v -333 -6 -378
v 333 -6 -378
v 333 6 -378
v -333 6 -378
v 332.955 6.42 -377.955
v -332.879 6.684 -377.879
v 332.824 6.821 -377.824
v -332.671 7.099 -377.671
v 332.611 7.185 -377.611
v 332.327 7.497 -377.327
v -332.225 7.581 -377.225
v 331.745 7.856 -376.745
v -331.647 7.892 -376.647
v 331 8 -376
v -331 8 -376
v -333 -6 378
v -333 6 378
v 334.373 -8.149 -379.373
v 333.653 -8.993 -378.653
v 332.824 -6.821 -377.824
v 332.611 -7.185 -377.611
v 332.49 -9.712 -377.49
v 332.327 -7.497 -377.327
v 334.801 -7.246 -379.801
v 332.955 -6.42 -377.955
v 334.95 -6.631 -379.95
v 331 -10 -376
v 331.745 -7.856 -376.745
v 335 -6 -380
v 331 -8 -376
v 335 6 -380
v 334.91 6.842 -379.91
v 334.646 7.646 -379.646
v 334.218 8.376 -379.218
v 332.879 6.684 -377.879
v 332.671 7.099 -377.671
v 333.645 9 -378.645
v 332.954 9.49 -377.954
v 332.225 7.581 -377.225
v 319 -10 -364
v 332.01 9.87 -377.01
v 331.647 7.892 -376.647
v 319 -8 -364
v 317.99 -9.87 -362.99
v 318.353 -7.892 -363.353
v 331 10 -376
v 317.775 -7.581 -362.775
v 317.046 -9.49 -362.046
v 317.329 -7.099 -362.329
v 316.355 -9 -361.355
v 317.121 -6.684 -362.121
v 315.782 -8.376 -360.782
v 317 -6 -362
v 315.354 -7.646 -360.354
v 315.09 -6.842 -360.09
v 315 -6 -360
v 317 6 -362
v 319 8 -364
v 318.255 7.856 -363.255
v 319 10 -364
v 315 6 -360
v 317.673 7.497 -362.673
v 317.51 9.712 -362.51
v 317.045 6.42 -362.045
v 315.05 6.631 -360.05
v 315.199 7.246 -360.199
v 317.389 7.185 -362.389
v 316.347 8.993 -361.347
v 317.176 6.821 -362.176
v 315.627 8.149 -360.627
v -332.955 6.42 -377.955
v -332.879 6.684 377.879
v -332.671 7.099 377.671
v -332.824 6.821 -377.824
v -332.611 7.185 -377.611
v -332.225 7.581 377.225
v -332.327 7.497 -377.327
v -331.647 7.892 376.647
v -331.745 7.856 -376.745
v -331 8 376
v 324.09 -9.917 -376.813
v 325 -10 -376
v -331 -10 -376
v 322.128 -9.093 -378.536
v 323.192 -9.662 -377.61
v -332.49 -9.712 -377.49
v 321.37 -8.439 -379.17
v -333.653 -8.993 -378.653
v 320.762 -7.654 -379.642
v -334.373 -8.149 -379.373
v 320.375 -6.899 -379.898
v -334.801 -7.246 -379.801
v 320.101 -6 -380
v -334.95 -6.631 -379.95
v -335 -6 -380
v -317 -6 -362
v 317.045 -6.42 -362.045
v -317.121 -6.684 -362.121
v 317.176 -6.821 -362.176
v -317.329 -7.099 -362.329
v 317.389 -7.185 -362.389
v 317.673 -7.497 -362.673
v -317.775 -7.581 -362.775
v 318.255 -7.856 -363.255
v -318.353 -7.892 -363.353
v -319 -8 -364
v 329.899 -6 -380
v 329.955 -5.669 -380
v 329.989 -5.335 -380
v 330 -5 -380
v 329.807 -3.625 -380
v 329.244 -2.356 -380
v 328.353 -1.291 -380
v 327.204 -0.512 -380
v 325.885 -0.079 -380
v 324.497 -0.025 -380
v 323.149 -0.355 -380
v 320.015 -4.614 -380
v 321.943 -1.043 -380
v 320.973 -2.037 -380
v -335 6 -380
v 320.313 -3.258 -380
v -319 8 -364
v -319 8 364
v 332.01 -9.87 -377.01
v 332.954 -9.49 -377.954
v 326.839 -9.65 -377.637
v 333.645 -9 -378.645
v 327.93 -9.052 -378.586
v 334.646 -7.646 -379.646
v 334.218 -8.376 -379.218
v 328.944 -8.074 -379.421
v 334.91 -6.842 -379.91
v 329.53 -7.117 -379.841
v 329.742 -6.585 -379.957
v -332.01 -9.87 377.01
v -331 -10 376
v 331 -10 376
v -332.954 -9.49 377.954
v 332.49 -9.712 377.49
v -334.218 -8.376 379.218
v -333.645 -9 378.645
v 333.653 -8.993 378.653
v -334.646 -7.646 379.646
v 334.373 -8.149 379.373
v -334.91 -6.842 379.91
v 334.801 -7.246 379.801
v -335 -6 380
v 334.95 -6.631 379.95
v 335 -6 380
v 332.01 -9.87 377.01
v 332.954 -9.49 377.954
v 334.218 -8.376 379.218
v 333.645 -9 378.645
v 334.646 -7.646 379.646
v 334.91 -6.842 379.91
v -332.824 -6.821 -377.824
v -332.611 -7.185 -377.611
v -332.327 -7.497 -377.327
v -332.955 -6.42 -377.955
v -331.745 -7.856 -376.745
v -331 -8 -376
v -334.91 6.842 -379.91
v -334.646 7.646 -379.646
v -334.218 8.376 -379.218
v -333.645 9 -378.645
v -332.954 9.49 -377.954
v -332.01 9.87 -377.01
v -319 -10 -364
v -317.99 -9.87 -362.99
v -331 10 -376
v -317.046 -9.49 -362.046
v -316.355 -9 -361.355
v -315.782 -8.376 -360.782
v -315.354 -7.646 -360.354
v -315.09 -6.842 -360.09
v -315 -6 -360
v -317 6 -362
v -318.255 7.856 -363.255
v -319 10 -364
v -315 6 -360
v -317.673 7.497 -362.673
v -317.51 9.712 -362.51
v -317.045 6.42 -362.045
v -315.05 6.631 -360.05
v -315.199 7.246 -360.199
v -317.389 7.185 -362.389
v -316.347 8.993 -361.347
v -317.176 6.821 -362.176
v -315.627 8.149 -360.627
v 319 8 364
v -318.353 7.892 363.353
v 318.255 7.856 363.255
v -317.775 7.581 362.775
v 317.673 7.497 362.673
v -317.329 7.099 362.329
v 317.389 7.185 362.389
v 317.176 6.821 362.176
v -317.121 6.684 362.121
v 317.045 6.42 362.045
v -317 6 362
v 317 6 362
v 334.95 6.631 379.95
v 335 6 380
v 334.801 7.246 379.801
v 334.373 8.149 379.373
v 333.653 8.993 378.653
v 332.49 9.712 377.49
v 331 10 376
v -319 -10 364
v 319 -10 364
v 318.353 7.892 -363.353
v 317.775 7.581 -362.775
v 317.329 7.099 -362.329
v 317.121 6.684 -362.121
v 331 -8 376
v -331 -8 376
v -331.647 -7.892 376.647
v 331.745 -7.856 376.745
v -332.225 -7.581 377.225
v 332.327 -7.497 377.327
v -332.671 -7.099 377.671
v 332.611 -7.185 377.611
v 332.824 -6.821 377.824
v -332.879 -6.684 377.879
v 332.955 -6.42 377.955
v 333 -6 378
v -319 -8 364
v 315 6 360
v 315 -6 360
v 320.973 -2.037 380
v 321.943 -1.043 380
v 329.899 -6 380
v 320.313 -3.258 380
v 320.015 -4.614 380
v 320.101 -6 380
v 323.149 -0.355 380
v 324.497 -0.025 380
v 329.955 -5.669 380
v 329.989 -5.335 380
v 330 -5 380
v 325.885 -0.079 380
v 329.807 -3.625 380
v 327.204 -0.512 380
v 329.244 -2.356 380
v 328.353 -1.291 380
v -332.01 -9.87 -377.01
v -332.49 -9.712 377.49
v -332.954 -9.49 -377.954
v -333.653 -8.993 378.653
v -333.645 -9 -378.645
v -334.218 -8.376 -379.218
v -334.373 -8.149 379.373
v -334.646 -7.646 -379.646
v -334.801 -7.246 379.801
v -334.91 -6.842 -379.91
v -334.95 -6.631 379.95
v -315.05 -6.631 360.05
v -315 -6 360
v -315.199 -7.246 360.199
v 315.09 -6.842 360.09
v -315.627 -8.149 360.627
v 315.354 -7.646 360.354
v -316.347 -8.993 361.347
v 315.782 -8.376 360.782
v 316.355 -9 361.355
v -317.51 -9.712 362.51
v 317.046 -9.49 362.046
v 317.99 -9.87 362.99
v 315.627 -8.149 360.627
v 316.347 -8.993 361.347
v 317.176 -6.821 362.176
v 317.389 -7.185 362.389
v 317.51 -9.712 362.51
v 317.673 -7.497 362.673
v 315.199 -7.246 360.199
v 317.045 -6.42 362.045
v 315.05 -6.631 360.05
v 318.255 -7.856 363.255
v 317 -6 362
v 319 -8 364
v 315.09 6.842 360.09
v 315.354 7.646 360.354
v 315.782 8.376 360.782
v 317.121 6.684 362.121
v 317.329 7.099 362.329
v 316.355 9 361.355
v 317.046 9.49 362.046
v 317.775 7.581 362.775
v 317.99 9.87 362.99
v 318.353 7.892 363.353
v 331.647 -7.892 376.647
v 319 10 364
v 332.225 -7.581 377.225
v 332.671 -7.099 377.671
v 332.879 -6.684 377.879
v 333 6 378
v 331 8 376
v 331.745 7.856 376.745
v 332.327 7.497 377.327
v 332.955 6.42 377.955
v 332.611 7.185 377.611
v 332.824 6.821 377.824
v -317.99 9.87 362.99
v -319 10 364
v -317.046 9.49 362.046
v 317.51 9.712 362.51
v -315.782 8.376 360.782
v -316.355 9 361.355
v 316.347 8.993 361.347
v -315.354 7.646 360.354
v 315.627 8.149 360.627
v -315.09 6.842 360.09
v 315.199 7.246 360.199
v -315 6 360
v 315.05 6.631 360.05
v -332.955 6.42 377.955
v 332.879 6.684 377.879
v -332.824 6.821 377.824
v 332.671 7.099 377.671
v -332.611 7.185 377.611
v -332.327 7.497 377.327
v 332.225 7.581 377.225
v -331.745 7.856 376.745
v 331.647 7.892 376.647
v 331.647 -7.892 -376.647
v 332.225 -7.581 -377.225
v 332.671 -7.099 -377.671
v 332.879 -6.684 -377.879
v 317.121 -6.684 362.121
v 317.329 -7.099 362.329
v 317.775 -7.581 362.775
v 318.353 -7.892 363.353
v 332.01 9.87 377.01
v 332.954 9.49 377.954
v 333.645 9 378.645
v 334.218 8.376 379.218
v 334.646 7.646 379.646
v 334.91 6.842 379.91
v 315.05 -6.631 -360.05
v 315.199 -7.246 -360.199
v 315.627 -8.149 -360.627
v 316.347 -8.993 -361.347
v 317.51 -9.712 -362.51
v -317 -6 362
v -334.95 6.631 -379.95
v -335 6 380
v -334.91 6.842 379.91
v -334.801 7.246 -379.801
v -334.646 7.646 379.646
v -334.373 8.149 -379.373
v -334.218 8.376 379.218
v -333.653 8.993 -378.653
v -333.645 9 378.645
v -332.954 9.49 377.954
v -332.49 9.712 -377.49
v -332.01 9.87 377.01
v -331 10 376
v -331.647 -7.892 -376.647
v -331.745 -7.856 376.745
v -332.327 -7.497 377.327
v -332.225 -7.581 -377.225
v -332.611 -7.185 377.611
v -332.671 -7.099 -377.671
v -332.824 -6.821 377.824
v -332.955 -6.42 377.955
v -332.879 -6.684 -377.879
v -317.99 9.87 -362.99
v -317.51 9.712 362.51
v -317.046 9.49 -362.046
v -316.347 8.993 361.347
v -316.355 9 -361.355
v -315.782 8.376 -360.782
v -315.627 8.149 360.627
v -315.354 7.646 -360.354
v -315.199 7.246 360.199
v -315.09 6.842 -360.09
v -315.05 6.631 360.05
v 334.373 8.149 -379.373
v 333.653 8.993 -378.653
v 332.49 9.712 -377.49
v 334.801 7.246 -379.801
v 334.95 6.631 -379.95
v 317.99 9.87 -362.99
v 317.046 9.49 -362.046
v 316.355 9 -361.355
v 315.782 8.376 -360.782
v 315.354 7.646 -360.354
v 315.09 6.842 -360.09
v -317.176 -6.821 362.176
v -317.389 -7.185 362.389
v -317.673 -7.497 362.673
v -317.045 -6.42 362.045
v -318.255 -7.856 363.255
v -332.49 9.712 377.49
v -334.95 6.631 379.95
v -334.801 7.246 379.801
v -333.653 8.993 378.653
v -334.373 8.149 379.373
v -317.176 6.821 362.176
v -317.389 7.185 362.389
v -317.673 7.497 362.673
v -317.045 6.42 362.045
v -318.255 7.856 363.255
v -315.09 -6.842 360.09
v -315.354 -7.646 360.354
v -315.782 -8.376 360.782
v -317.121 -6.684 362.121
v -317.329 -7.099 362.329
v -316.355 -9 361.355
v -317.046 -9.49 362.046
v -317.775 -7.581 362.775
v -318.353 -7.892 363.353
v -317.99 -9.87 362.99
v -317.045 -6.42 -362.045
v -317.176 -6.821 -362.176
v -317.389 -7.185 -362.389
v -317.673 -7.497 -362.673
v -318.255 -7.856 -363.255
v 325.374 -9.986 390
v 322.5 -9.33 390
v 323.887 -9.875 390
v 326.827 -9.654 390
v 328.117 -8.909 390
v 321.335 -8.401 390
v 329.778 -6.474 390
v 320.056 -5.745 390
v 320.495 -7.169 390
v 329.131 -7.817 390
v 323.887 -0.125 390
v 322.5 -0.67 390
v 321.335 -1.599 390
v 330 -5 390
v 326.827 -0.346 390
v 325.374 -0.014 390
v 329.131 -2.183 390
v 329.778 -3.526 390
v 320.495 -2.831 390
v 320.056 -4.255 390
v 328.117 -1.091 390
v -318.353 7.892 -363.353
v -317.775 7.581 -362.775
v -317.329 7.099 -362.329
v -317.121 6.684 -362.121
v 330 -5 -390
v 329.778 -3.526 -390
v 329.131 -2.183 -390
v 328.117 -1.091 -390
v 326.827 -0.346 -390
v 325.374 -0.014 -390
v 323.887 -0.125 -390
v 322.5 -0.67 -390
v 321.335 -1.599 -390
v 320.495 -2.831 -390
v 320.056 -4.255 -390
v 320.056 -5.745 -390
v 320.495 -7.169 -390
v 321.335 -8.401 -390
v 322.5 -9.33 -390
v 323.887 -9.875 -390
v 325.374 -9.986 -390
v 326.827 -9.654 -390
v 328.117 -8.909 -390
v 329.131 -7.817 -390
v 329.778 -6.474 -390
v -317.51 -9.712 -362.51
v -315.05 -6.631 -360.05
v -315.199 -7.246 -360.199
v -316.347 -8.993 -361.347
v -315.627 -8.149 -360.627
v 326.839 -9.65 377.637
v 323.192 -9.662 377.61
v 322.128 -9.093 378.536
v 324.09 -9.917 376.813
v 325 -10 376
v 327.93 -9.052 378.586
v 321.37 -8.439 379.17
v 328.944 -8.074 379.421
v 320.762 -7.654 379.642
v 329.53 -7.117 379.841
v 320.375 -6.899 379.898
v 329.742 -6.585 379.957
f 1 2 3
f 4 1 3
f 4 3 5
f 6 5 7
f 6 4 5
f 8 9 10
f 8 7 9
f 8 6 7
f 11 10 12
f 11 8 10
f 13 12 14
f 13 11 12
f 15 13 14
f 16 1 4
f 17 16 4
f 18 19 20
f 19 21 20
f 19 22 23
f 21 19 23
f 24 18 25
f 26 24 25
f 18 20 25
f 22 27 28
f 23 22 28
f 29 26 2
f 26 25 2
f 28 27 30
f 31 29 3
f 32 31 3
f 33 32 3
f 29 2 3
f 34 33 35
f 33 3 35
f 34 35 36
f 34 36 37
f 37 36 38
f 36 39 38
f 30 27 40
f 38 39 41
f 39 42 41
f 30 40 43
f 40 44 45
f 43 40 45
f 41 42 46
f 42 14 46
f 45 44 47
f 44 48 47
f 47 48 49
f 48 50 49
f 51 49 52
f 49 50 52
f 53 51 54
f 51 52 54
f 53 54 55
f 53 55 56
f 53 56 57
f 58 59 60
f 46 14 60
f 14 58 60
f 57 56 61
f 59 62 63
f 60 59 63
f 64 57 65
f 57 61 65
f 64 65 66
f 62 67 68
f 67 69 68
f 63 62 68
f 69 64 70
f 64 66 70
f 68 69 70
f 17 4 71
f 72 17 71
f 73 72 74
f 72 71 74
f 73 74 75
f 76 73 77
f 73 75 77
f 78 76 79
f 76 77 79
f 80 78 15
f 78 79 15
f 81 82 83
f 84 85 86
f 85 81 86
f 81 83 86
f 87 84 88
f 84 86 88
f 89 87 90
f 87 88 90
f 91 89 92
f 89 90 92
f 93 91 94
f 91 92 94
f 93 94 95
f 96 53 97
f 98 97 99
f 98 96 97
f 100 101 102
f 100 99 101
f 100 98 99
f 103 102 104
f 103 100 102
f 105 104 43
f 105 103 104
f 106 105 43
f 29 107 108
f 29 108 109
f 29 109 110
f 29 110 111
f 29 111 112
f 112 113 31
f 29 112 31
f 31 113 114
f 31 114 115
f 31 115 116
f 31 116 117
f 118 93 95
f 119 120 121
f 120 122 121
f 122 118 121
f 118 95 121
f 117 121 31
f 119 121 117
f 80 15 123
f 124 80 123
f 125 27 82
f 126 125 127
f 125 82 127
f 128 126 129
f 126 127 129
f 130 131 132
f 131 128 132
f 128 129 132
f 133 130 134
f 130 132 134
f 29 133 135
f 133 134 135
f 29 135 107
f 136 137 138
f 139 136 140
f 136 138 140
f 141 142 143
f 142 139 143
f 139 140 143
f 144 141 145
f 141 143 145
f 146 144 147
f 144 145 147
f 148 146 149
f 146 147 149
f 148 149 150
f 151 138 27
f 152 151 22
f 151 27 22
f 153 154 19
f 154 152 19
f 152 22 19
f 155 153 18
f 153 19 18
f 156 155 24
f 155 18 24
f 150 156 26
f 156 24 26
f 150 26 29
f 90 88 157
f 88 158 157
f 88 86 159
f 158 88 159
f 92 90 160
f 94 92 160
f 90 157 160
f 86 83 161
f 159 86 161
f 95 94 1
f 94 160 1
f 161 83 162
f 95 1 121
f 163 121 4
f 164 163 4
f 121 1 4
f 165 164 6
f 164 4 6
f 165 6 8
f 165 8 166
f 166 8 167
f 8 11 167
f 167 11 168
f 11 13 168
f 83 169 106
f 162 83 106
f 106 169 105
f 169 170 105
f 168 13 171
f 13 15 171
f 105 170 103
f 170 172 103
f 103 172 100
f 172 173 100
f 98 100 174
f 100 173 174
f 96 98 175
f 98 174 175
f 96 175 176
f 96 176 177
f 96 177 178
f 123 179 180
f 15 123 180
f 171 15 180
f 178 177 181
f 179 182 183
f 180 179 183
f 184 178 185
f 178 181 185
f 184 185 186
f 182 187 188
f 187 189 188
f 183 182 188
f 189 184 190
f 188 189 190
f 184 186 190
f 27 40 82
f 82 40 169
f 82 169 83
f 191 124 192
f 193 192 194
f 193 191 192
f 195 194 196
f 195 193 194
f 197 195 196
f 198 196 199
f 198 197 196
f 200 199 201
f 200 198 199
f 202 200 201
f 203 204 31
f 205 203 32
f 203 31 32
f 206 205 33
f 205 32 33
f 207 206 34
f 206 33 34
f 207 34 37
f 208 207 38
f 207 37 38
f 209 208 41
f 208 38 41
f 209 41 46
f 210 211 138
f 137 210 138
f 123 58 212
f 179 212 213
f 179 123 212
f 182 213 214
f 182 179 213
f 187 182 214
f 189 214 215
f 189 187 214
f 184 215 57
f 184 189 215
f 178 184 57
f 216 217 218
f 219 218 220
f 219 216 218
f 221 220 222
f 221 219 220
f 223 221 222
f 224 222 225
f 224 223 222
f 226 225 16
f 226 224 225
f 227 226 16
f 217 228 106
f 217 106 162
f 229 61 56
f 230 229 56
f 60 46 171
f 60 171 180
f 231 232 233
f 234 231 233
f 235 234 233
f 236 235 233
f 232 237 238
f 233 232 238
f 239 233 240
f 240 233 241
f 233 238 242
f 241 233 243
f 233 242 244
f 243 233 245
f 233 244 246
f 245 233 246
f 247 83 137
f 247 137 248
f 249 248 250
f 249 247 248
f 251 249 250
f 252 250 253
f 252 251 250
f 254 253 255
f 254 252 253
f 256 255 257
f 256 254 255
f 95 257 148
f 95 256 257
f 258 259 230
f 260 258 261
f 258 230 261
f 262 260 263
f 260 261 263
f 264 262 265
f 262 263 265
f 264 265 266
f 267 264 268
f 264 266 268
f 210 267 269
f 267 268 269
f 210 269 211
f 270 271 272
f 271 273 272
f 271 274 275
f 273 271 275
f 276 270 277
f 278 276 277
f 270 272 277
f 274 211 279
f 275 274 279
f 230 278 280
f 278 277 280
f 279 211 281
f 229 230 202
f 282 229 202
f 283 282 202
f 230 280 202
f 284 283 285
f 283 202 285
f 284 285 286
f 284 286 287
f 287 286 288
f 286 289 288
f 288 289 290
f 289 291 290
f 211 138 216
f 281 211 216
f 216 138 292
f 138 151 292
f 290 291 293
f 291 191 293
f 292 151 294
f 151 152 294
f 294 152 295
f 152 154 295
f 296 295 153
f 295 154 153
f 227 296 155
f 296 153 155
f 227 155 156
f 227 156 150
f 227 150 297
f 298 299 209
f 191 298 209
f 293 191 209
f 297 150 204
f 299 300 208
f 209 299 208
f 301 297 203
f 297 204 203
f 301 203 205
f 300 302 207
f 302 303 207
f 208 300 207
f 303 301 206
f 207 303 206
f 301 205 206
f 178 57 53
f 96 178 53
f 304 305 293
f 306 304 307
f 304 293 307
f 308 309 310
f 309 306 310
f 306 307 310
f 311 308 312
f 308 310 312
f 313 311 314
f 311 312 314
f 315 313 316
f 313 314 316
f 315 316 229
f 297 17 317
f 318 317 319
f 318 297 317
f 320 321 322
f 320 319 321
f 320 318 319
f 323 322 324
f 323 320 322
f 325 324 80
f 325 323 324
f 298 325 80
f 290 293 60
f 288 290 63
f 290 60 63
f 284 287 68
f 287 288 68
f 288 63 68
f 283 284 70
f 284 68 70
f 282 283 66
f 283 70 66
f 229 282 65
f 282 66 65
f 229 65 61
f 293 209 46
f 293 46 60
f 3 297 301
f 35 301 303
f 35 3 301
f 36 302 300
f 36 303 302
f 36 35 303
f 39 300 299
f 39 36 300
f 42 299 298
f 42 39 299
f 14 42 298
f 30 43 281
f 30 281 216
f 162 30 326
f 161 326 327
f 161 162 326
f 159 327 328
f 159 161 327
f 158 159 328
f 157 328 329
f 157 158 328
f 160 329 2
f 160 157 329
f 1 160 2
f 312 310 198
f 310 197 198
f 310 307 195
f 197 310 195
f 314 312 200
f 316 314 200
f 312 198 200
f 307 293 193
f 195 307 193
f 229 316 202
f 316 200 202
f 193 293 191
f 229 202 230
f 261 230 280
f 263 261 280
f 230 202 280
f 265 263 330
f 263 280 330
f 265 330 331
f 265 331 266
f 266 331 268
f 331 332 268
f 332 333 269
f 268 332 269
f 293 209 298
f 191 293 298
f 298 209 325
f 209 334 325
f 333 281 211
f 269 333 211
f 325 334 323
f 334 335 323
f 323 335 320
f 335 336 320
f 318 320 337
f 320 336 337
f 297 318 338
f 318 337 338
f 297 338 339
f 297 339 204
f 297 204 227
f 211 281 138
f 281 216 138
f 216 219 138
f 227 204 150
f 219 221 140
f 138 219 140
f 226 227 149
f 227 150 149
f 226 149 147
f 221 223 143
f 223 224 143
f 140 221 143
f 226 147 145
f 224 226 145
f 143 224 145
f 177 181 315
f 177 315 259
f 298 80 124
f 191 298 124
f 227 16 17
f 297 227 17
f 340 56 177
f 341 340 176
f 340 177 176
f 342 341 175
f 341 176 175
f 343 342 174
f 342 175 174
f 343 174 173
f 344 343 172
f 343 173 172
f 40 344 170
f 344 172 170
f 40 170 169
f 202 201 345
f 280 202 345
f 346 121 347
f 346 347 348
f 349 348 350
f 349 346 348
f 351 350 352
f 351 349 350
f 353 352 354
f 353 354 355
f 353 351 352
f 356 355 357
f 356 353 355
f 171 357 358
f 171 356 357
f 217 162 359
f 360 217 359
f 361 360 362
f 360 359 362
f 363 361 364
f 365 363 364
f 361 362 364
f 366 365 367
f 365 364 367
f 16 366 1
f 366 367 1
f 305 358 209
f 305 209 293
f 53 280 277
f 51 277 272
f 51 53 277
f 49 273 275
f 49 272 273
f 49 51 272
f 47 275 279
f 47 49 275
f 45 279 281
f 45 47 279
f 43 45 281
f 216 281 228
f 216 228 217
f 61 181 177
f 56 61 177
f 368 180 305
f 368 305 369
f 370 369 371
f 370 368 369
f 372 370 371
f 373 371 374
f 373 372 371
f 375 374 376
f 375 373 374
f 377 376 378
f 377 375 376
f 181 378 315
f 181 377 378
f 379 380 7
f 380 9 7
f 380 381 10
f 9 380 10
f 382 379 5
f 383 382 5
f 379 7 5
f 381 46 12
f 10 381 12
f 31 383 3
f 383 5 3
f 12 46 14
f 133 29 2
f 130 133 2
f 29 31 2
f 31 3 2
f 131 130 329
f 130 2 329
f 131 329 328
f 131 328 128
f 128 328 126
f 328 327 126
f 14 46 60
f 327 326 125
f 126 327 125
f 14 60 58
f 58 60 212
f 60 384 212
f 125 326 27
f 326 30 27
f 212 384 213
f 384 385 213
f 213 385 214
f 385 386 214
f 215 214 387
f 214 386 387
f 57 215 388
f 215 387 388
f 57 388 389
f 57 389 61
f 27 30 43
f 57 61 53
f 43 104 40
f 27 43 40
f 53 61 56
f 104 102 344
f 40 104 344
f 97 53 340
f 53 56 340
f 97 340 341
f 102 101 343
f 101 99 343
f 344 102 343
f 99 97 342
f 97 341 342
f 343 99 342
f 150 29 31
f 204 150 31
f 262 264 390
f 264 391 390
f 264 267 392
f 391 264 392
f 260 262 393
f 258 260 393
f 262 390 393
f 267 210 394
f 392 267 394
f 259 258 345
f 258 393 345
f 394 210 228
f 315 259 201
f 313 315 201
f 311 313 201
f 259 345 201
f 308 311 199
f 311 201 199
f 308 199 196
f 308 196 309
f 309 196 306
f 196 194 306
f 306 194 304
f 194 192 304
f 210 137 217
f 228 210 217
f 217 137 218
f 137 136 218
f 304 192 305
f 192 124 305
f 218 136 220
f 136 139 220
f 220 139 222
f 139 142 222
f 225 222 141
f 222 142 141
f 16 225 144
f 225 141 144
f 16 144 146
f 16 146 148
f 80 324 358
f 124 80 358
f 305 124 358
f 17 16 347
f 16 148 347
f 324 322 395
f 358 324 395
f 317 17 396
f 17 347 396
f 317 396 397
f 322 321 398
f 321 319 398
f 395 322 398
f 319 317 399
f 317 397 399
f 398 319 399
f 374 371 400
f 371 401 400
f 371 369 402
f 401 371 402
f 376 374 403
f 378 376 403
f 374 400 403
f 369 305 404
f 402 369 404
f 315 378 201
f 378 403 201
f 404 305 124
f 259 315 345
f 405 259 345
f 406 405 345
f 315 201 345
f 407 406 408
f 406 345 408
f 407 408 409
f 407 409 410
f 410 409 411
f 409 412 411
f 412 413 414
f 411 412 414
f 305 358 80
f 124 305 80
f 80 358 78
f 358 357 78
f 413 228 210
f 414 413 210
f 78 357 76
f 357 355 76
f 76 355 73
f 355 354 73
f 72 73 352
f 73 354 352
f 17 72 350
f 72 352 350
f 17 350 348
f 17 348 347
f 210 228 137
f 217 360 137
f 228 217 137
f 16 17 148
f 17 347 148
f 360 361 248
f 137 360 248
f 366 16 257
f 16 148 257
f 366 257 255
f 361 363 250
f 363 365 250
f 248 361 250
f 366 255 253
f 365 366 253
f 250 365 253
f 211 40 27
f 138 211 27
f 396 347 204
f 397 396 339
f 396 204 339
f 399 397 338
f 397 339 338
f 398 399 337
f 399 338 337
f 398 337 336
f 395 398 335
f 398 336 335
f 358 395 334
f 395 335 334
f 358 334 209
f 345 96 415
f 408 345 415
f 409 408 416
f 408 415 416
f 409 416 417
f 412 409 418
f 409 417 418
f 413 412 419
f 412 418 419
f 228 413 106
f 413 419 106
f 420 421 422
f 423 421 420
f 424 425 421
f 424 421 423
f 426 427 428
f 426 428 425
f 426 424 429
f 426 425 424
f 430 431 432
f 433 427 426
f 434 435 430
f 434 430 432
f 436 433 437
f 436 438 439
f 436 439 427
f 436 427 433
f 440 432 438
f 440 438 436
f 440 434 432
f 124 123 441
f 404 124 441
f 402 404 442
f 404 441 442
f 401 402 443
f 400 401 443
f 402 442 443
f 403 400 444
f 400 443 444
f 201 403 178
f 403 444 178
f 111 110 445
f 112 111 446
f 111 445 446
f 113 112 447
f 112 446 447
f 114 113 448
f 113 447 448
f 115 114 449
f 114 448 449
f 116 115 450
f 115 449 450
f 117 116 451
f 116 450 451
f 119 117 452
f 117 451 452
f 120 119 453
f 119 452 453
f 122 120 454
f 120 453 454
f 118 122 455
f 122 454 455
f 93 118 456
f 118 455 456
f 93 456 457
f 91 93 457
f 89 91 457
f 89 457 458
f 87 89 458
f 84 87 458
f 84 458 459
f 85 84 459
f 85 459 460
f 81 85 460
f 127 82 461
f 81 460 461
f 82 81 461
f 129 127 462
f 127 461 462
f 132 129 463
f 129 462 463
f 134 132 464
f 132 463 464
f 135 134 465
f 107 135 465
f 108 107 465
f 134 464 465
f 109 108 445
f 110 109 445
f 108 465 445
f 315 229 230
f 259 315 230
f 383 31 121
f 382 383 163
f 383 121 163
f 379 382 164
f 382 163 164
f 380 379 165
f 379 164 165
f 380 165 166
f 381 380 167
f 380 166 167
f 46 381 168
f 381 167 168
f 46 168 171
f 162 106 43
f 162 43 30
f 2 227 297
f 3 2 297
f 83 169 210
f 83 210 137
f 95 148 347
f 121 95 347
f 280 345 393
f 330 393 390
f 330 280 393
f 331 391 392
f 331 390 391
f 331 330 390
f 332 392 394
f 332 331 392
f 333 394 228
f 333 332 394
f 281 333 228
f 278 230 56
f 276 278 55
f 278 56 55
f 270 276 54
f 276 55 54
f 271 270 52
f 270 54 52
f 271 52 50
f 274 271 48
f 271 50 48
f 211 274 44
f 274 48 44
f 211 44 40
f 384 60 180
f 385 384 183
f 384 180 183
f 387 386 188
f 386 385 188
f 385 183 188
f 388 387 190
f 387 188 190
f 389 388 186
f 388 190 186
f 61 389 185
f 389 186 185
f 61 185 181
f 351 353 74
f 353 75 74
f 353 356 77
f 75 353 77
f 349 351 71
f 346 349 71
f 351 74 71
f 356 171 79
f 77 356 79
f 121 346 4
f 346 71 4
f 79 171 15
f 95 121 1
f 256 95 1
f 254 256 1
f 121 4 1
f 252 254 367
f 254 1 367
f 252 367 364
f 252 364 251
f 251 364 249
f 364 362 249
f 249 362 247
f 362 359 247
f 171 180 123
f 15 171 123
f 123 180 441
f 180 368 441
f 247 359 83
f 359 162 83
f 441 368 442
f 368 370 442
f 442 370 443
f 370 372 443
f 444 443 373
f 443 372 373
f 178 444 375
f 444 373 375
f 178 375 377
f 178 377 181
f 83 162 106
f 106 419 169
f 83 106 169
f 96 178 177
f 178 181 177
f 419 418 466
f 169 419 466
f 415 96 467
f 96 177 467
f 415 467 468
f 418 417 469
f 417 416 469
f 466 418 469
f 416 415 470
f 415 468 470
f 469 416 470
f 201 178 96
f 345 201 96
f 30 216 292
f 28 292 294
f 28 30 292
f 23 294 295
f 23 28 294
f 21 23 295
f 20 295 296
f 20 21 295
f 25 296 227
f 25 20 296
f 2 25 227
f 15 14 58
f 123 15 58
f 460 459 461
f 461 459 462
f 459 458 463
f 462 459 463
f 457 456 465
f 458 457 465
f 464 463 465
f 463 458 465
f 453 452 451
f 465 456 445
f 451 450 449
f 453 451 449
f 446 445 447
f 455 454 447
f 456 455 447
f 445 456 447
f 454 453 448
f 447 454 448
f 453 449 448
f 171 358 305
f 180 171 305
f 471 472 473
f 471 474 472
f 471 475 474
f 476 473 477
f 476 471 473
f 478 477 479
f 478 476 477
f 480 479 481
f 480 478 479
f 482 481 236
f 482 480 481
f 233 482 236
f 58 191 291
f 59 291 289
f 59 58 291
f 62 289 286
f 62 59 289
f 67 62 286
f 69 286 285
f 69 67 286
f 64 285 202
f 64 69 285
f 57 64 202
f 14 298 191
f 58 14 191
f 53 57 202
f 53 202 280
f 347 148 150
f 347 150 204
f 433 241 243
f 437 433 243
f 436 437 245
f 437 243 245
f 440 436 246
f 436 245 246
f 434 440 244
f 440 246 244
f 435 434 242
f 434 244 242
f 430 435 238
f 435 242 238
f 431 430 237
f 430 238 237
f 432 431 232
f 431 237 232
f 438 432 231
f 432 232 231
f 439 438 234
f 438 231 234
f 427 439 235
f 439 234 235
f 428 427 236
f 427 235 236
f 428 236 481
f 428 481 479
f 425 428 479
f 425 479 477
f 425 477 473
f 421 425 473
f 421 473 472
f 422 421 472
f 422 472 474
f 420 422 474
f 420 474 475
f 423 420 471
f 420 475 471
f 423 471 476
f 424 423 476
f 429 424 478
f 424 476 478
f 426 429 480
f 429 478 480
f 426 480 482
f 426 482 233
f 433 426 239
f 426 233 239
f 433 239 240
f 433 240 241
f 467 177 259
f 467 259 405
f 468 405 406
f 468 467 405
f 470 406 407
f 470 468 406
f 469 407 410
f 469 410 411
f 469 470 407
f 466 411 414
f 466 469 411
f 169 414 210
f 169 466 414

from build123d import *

# Parameters (mm, degrees)
SQUARE_TUBE_CONFIGURED_20_X_20_X_2_1_DEPTH      = 755.142135624
SQUARE_TUBE_CONFIGURED_20_X_20_X_2_1_DEPTH_BACK = 15.142135624
SQUARE_TUBE_CONFIGURED_20_X_20_X_2_1_2_DEPTH    = 680.284271247
SQUARE_TUBE_CONFIGURED_20_X_20_X_2_1_3_DEPTH    = 770.284271247
SQUARE_TUBE_CONFIGURED_20_X_20_X_2_1_4_DEPTH    = 680.284271247
SKETCH13_R                                      = 5
BOSS_EXTRUDE1_DEPTH                             = 10
BOSS_EXTRUDE1_DIRECTION_2_REACH                 = 832.617


with BuildPart() as part:
    # Sketch12 → Square tube - configured 20 X 20 X 2(1) (new, two sides)
    with BuildSketch(Plane(origin=(-325, 0, 370), x_dir=(-1, 0, 0), z_dir=(0, 0, -1))) as square_tube_configured_20_x_20_x_2_1_sk:
        with BuildLine():
            Line((-6, -10), (6, -10))
            ThreePointArc((6, -10), (8.828427125, -8.828427125), (10, -6))
            Line((10, -6), (10, 6))
            ThreePointArc((10, 6), (8.828427125, 8.828427125), (6, 10))
            Line((6, 10), (-6, 10))
            ThreePointArc((-6, 10), (-8.828427125, 8.828427125), (-10, 6))
            Line((-10, 6), (-10, -6))
            ThreePointArc((-10, -6), (-8.828427125, -8.828427125), (-6, -10))
        make_face()
        with BuildLine():
            Line((-6, -8), (6, -8))
            ThreePointArc((6, -8), (7.414213562, -7.414213562), (8, -6))
            Line((8, -6), (8, 6))
            ThreePointArc((8, 6), (7.414213562, 7.414213562), (6, 8))
            Line((6, 8), (-6, 8))
            ThreePointArc((-6, 8), (-7.414213562, 7.414213562), (-8, 6))
            Line((-8, 6), (-8, -6))
            ThreePointArc((-8, -6), (-7.414213562, -7.414213562), (-6, -8))
        make_face(mode=Mode.SUBTRACT)
    extrude(amount=SQUARE_TUBE_CONFIGURED_20_X_20_X_2_1_DEPTH)
    extrude(square_tube_configured_20_x_20_x_2_1_sk.sketch, amount=-SQUARE_TUBE_CONFIGURED_20_X_20_X_2_1_DEPTH_BACK)

    # Square tube - configured 20 X 20 X 2(1) m
    split(bisect_by=Plane(origin=(-325, 0, 370), x_dir=(0, -1, 0), z_dir=(-0.707106781, 0, -0.707106781)), keep=Keep.TOP)

    # Square tube - configured 20 X 20 X 2 2
    split(bisect_by=Plane(origin=(-325, 0, -370), x_dir=(0, -1, 0), z_dir=(-0.707106781, 0, 0.707106781)), keep=Keep.TOP)


with BuildPart() as body_2:
    # Sketch12 on segment 2 (carried to segment 2) → Square tube - configured 20 X 20 X 2_1 2 (new body)
    with BuildSketch(Plane(origin=(-340.142135624, 0, -370), x_dir=(0, 0, -1), z_dir=(1, 0, 0))):
        with BuildLine():
            Line((-6, -10), (6, -10))
            ThreePointArc((6, -10), (8.828427125, -8.828427125), (10, -6))
            Line((10, -6), (10, 6))
            ThreePointArc((10, 6), (8.828427125, 8.828427125), (6, 10))
            Line((6, 10), (-6, 10))
            ThreePointArc((-6, 10), (-8.828427125, 8.828427125), (-10, 6))
            Line((-10, 6), (-10, -6))
            ThreePointArc((-10, -6), (-8.828427125, -8.828427125), (-6, -10))
        make_face()
        with BuildLine():
            Line((-6, -8), (6, -8))
            ThreePointArc((6, -8), (7.414213562, -7.414213562), (8, -6))
            Line((8, -6), (8, 6))
            ThreePointArc((8, 6), (7.414213562, 7.414213562), (6, 8))
            Line((6, 8), (-6, 8))
            ThreePointArc((-6, 8), (-7.414213562, 7.414213562), (-8, 6))
            Line((-8, 6), (-8, -6))
            ThreePointArc((-8, -6), (-7.414213562, -7.414213562), (-6, -8))
        make_face(mode=Mode.SUBTRACT)
    extrude(amount=SQUARE_TUBE_CONFIGURED_20_X_20_X_2_1_2_DEPTH)

    # Square tube - configured 20 X 20 X 2 3
    split(bisect_by=Plane(origin=(325, 0, -370), x_dir=(0, -1, 0), z_dir=(-0.707106781, 0, -0.707106781)), keep=Keep.TOP)

    # Square tube - configured 20 X 20 X 2 4
    split(bisect_by=Plane(origin=(-325, 0, -370), x_dir=(0, 1, 0), z_dir=(0.707106781, 0, -0.707106781)), keep=Keep.TOP)


with BuildPart() as body_3:
    # Sketch12 on segment 3 (carried to segment 3) → Square tube - configured 20 X 20 X 2_1 3 (new body)
    with BuildSketch(Plane(origin=(325, 0, -385.142135624), x_dir=(1, 0, 0), z_dir=(0, 0, 1))):
        with BuildLine():
            Line((-6, -10), (6, -10))
            ThreePointArc((6, -10), (8.828427125, -8.828427125), (10, -6))
            Line((10, -6), (10, 6))
            ThreePointArc((10, 6), (8.828427125, 8.828427125), (6, 10))
            Line((6, 10), (-6, 10))
            ThreePointArc((-6, 10), (-8.828427125, 8.828427125), (-10, 6))
            Line((-10, 6), (-10, -6))
            ThreePointArc((-10, -6), (-8.828427125, -8.828427125), (-6, -10))
        make_face()
        with BuildLine():
            Line((-6, -8), (6, -8))
            ThreePointArc((6, -8), (7.414213562, -7.414213562), (8, -6))
            Line((8, -6), (8, 6))
            ThreePointArc((8, 6), (7.414213562, 7.414213562), (6, 8))
            Line((6, 8), (-6, 8))
            ThreePointArc((-6, 8), (-7.414213562, 7.414213562), (-8, 6))
            Line((-8, 6), (-8, -6))
            ThreePointArc((-8, -6), (-7.414213562, -7.414213562), (-6, -8))
        make_face(mode=Mode.SUBTRACT)
    extrude(amount=SQUARE_TUBE_CONFIGURED_20_X_20_X_2_1_3_DEPTH)

    # Square tube - configured 20 X 20 X 2 5
    split(bisect_by=Plane(origin=(325, 0, 370), x_dir=(0, 1, 0), z_dir=(0.707106781, 0, -0.707106781)), keep=Keep.TOP)

    # Square tube - configured 20 X 20 X 2 6
    split(bisect_by=Plane(origin=(325, 0, -370), x_dir=(0, 1, 0), z_dir=(0.707106781, 0, 0.707106781)), keep=Keep.TOP)


with BuildPart() as body_4:
    # Sketch12 on segment 4 (carried to segment 4) → Square tube - configured 20 X 20 X 2_1 4 (new body)
    with BuildSketch(Plane(origin=(340.142135624, 0, 370), x_dir=(0, 0, 1), z_dir=(-1, 0, 0))):
        with BuildLine():
            Line((-6, -10), (6, -10))
            ThreePointArc((6, -10), (8.828427125, -8.828427125), (10, -6))
            Line((10, -6), (10, 6))
            ThreePointArc((10, 6), (8.828427125, 8.828427125), (6, 10))
            Line((6, 10), (-6, 10))
            ThreePointArc((-6, 10), (-8.828427125, 8.828427125), (-10, 6))
            Line((-10, 6), (-10, -6))
            ThreePointArc((-10, -6), (-8.828427125, -8.828427125), (-6, -10))
        make_face()
        with BuildLine():
            Line((-6, -8), (6, -8))
            ThreePointArc((6, -8), (7.414213562, -7.414213562), (8, -6))
            Line((8, -6), (8, 6))
            ThreePointArc((8, 6), (7.414213562, 7.414213562), (6, 8))
            Line((6, 8), (-6, 8))
            ThreePointArc((-6, 8), (-7.414213562, 7.414213562), (-8, 6))
            Line((-8, 6), (-8, -6))
            ThreePointArc((-8, -6), (-7.414213562, -7.414213562), (-6, -8))
        make_face(mode=Mode.SUBTRACT)
    extrude(amount=SQUARE_TUBE_CONFIGURED_20_X_20_X_2_1_4_DEPTH)

    # Square tube - configured 20 X 20 X 2 7
    split(bisect_by=Plane(origin=(325, 0, 370), x_dir=(0, -1, 0), z_dir=(-0.707106781, 0, 0.707106781)), keep=Keep.TOP)

    # Square tube - configured 20 X 20 X 2 8
    split(bisect_by=Plane(origin=(-325, 0, 370), x_dir=(0, 1, 0), z_dir=(0.707106781, 0, 0.707106781)), keep=Keep.TOP)


with BuildPart() as body_5:
    # Sketch13 → Boss-Extrude1 (new body)
    with BuildSketch(Plane.XY.offset(380)):
        with Locations((325, -5)):
            Circle(SKETCH13_R)
    boss_extrude1 = extrude(amount=BOSS_EXTRUDE1_DEPTH)


    # Sketch13 → Boss-Extrude1 direction 2 (add, up to next)
    with BuildSketch(Plane.XY.offset(380), mode=Mode.PRIVATE) as boss_extrude1_direction_2_sk1:
        with Locations((325, -5)):
            Circle(SKETCH13_R)
    boss_extrude1_direction_2_tool1 = extrude(boss_extrude1_direction_2_sk1.sketch, amount=-BOSS_EXTRUDE1_DIRECTION_2_REACH, mode=Mode.PRIVATE) - body_4.part
    boss_extrude1_direction_2 = boss_extrude1_direction_2_tool1.solids().sort_by_distance((325, -5, 380))[0]
    add(boss_extrude1_direction_2)


with BuildPart() as body_2_1:
    add(body_2.part)

    # Mirror2: Boss-Extrude1, Boss-Extrude1 direction 2 across plane
    add(boss_extrude1.mirror(Plane.XY))
    add(boss_extrude1_direction_2.mirror(Plane.XY))


solid = Compound([part.part, body_3.part, body_4.part, body_5.part, body_2_1.part])
